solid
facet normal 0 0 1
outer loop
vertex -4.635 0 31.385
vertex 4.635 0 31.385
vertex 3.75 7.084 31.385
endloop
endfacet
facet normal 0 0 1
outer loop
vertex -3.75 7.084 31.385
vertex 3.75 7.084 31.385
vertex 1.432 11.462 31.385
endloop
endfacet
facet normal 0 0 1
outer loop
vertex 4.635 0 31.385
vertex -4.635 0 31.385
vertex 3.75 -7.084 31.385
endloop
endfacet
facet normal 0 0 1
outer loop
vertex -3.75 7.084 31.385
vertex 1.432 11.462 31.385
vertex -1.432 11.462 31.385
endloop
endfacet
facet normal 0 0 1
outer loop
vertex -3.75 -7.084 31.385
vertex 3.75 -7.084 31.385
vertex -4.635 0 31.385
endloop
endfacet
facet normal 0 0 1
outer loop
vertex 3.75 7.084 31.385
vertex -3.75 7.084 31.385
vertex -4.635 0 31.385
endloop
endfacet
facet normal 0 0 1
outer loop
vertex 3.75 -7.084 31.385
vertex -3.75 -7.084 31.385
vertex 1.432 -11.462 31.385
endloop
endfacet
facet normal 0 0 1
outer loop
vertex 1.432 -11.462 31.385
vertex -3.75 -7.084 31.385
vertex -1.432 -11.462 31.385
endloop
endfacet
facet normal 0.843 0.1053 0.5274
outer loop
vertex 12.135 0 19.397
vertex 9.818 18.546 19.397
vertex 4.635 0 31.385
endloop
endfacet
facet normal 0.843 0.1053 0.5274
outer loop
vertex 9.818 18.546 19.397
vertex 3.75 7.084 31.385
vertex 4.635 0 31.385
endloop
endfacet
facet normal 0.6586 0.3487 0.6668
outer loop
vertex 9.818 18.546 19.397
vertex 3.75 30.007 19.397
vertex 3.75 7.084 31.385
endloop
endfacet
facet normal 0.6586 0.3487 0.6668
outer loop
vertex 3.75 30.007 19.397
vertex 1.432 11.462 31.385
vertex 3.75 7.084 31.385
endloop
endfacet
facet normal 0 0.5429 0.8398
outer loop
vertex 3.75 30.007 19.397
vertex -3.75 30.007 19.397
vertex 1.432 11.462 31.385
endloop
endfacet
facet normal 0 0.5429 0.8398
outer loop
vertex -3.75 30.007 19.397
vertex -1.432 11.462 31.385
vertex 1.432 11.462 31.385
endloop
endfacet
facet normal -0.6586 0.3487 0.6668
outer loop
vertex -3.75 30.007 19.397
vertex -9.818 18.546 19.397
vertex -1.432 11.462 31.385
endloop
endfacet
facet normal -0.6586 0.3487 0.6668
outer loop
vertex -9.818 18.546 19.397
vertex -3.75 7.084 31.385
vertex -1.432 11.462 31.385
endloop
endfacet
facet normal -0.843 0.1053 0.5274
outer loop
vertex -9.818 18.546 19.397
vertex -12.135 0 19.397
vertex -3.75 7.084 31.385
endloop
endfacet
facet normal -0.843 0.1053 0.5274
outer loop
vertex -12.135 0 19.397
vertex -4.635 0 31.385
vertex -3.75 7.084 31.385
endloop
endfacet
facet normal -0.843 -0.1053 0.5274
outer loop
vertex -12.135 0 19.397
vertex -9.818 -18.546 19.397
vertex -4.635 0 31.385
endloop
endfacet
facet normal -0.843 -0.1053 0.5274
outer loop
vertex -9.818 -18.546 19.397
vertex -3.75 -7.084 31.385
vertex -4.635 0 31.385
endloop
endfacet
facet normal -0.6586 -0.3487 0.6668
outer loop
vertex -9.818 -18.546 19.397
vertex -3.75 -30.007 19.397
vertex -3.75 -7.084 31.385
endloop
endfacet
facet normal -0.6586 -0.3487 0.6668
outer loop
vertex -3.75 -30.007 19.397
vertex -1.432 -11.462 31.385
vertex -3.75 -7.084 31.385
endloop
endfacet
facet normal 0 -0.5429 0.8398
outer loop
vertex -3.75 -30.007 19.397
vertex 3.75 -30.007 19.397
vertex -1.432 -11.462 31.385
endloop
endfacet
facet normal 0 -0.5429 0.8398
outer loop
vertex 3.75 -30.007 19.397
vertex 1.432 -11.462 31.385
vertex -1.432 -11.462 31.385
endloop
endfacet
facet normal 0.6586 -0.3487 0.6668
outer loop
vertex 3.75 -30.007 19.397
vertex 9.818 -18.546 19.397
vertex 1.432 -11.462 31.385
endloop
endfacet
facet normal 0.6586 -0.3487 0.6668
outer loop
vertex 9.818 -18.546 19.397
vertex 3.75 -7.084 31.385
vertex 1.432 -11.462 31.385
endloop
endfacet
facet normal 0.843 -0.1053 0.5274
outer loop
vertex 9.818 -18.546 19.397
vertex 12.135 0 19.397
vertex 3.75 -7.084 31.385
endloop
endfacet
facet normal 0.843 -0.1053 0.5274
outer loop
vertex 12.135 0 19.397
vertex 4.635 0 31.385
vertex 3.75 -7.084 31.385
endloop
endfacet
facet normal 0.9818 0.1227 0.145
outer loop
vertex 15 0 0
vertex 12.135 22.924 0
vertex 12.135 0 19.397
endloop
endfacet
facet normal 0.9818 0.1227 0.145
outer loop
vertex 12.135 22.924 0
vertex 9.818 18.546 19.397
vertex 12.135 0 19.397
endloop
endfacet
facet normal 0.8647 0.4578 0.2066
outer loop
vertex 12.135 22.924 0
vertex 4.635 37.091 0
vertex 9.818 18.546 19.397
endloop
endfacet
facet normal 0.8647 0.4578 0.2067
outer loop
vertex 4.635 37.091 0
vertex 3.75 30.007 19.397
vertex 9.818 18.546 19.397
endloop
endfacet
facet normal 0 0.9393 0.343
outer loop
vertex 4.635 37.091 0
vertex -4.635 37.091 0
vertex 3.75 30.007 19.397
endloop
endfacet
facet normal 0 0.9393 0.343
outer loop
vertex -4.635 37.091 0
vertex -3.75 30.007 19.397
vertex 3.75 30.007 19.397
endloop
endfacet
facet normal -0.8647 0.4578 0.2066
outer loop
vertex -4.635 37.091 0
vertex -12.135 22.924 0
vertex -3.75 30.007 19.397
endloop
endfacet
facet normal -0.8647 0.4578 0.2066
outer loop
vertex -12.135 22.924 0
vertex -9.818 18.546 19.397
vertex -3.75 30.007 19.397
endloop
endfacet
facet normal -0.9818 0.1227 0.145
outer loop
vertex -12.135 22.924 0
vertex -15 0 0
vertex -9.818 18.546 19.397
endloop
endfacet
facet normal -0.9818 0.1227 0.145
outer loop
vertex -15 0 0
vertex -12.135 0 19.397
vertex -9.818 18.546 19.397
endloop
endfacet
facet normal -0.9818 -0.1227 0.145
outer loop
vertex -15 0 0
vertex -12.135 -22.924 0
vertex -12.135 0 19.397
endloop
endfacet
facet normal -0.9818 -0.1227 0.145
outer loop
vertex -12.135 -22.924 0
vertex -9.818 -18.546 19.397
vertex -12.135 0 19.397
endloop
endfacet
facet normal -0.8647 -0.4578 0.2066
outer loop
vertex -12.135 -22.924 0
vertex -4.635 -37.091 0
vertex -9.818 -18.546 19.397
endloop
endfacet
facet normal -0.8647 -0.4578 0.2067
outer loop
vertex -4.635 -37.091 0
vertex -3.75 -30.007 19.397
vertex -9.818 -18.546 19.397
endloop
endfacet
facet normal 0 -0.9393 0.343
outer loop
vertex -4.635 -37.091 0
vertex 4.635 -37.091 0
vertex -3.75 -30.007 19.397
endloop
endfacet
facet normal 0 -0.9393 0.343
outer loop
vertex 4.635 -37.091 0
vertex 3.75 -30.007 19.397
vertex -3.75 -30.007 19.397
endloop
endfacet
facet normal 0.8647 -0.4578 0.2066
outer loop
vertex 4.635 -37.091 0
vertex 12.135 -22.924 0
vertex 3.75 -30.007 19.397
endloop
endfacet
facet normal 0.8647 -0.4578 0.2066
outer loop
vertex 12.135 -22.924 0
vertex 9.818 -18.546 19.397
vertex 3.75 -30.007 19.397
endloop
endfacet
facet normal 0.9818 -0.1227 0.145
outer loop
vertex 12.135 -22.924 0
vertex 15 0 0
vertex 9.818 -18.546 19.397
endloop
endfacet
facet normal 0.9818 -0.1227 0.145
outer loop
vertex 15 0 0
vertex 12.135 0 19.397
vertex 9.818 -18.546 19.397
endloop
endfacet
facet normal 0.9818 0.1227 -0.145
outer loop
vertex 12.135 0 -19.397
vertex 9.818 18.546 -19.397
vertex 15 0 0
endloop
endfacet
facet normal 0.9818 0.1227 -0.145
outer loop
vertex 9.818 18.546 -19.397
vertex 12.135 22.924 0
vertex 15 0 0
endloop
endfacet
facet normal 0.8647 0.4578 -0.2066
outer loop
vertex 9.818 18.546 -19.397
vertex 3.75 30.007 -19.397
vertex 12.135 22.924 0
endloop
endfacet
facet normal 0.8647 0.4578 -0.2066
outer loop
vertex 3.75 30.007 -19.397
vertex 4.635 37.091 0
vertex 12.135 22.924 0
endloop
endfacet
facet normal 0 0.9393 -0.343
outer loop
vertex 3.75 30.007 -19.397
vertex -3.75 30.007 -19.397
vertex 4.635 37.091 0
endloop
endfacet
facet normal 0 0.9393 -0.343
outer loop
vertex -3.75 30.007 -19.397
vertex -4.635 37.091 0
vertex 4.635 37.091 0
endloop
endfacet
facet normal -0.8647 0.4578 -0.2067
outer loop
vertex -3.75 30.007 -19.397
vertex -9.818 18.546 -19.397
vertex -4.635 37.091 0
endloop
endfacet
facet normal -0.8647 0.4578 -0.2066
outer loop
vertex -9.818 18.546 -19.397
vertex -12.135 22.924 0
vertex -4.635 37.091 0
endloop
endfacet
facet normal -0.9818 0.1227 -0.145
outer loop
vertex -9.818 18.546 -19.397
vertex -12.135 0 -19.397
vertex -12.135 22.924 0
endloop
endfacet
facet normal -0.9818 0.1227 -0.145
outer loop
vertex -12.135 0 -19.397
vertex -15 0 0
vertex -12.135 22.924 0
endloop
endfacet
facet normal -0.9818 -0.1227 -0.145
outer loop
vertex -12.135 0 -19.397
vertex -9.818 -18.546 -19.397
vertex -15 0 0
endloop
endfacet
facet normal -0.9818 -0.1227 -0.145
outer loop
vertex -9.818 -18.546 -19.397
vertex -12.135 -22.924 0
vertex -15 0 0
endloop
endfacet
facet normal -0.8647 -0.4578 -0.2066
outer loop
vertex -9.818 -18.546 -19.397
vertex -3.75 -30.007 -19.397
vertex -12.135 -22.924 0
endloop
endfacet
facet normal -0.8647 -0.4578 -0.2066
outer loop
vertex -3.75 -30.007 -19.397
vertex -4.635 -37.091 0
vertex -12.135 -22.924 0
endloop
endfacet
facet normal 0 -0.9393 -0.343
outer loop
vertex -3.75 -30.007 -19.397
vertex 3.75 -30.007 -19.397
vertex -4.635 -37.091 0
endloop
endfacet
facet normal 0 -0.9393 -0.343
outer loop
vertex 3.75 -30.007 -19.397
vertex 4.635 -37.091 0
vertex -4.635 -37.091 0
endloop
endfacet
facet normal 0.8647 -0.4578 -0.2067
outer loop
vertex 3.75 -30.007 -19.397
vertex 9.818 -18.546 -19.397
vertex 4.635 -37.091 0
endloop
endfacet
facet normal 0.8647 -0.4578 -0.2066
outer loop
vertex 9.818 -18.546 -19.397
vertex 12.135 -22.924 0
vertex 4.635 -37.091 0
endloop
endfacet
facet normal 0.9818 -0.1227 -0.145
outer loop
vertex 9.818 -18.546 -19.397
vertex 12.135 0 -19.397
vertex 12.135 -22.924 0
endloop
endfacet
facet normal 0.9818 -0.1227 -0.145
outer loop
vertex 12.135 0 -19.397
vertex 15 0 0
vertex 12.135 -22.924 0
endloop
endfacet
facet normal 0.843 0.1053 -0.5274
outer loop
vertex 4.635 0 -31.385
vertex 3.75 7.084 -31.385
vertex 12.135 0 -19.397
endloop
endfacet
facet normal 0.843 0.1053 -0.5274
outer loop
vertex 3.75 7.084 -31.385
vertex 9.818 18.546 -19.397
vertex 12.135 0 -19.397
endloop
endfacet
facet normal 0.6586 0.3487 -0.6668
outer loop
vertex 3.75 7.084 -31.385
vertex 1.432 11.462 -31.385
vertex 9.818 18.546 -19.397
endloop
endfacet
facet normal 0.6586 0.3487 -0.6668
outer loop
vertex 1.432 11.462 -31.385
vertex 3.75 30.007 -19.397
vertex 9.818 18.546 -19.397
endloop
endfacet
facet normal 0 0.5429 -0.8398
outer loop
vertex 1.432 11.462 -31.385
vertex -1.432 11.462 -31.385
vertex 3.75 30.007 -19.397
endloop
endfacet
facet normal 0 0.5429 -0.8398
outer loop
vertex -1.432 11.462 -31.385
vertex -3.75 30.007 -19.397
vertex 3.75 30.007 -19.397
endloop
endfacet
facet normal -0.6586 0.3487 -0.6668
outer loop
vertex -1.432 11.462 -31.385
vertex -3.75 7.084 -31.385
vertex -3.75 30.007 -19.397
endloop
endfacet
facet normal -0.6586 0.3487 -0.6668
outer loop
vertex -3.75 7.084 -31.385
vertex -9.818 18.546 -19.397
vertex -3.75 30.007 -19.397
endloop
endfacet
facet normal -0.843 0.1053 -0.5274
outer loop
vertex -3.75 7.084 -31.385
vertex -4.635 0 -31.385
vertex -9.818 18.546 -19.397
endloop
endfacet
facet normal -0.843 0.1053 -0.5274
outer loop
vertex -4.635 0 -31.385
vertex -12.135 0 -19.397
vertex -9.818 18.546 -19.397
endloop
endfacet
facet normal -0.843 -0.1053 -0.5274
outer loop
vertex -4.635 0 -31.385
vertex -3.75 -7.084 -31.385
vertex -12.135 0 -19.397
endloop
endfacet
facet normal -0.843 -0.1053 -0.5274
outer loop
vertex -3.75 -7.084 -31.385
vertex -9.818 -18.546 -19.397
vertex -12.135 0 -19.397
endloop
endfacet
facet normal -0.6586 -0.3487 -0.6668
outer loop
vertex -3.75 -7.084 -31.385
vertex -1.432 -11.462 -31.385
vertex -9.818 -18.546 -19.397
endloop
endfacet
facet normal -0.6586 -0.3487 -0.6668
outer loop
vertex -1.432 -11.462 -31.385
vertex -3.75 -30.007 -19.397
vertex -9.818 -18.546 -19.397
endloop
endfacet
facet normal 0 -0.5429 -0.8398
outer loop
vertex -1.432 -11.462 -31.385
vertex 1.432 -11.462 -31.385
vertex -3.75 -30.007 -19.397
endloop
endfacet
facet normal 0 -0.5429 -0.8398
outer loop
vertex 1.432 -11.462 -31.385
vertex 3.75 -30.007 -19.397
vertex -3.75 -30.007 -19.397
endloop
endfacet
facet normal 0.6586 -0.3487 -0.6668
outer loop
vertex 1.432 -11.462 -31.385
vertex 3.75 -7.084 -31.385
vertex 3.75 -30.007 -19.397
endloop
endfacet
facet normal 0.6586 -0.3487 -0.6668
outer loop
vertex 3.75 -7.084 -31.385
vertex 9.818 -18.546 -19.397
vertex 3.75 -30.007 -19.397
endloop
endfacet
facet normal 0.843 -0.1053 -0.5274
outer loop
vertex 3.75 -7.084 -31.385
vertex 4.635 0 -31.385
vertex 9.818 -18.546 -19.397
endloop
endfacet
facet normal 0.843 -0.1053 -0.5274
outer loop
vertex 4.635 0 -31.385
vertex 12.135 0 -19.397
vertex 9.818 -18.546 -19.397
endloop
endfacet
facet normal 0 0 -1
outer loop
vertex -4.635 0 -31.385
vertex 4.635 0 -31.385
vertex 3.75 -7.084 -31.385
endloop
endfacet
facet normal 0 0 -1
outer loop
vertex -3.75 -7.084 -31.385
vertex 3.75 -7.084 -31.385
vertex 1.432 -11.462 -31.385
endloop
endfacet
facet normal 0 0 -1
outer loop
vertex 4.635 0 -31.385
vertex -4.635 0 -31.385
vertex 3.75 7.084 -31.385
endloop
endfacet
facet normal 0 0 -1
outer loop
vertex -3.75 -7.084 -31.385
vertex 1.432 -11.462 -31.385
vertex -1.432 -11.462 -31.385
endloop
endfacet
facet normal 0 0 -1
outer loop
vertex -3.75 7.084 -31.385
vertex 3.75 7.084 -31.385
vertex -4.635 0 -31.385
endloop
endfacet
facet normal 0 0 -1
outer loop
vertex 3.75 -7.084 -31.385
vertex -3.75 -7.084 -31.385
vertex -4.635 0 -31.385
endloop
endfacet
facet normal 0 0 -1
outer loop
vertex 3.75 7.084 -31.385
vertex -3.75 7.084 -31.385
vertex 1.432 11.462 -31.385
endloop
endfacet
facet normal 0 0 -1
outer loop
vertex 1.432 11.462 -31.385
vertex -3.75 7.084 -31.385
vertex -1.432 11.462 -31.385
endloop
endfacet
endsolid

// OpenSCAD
// Generated by SolidPython 1.0.1 on 2020-07-29 00:46:46


scale(v = [5, 13, 11]) {
	sphere(r = 3);
}
/***********************************************
*********      SolidPython code:      **********
************************************************
 
# import packages: SolidPython
from solid import *
from solid.utils import *
from itertools import chain, combinations, permutations


class Resize:

    def __init__(self, scad_file):
        self.scad_file = scad_file
        #self.scad_file = import_scad(scad_file)
        # cone/cylinder param:
        self.r1 = 0
        self.r2 = 0
        self.h = 0
        # rectangular prism param:
        self.w = 0
        self.l = 0
        # ellipse param:
        self.r = 0

    # import OpenScad code (file name corresponds to shape)


    # classify shape + parameters
    def assign(self, param1, param2, param3):
        if self.scad_file == 'cone.scad':
            self.r1 = param1
            self.r2 = param2
            self.h = param3
        elif self.scad_file == 'cylinder.scad':
            self.r1 = param1
            self.r2 = param2
            self.h = param3
        elif self.scad_file == 'rectangularPrism.scad':
            self.h = param1
            self.l = param2
            self.w = param3
        else:
            self.r = param1
            self.h = param2

    # resize parameters
    def iterate(self):
        x = range(3, 20, 2)
        i = 1
        if self.scad_file == 'cone.scad':
            tempList = list(permutations(x, 2))
            for temp in tempList:
                param1 = temp[0]
                param2 = temp[1]
                filepath = 'produced_scad_files/' + 'cone' + str(param1) + '_' + str(param2) + '_' + '.scad'
                scad_render_to_file(cylinder(h=param1, r1=param2, r2=0), filepath)

        elif self.scad_file == 'cylinder.scad':
            tempList = list(permutations(x, 3))
            for temp in tempList:
                param1 = temp[0]
                param2 = temp[1]
                filepath = 'produced_scad_files/' + 'cylinder' + str(param1) + '_' + str(param2) + '_' + '.scad'
                scad_render_to_file(cylinder(h=param1, r1=param2, r2=param2), filepath)

        elif self.scad_file == 'rectangularPrism.scad':
            tempList = list(permutations(x, 3))
            for temp in tempList:
                param1 = temp[0]
                param2 = temp[1]
                param3 = temp[2]
                filepath = 'produced_scad_files/' + 'rectangularPrism' + str(param1) + '_' + str(param2) + '_' + str(
                    param3) + '.scad'
                scad_render_to_file(cube(size=(param1, param2, param3)), filepath)

        elif self.scad_file == 'ellipse.scad':
            tempList = list(permutations(x, 4))
            for temp in tempList:
                param1 = temp[0]
                param2 = temp[1]
                param3 = temp[2]
                param4 = temp[3]
                filepath = 'produced_scad_files/' + 'ellipse' + str(param1) + '_' + str(param2) + '_' + str(param3) + '_' + str(param4) + '.scad'
                scad_render_to_file(scale([param1, param2, param3])(sphere(r=param4)), filepath)

    def render_to_scadfile(self):
        scad_render_to_file(scad, 'example.scad') 
 
************************************************/
